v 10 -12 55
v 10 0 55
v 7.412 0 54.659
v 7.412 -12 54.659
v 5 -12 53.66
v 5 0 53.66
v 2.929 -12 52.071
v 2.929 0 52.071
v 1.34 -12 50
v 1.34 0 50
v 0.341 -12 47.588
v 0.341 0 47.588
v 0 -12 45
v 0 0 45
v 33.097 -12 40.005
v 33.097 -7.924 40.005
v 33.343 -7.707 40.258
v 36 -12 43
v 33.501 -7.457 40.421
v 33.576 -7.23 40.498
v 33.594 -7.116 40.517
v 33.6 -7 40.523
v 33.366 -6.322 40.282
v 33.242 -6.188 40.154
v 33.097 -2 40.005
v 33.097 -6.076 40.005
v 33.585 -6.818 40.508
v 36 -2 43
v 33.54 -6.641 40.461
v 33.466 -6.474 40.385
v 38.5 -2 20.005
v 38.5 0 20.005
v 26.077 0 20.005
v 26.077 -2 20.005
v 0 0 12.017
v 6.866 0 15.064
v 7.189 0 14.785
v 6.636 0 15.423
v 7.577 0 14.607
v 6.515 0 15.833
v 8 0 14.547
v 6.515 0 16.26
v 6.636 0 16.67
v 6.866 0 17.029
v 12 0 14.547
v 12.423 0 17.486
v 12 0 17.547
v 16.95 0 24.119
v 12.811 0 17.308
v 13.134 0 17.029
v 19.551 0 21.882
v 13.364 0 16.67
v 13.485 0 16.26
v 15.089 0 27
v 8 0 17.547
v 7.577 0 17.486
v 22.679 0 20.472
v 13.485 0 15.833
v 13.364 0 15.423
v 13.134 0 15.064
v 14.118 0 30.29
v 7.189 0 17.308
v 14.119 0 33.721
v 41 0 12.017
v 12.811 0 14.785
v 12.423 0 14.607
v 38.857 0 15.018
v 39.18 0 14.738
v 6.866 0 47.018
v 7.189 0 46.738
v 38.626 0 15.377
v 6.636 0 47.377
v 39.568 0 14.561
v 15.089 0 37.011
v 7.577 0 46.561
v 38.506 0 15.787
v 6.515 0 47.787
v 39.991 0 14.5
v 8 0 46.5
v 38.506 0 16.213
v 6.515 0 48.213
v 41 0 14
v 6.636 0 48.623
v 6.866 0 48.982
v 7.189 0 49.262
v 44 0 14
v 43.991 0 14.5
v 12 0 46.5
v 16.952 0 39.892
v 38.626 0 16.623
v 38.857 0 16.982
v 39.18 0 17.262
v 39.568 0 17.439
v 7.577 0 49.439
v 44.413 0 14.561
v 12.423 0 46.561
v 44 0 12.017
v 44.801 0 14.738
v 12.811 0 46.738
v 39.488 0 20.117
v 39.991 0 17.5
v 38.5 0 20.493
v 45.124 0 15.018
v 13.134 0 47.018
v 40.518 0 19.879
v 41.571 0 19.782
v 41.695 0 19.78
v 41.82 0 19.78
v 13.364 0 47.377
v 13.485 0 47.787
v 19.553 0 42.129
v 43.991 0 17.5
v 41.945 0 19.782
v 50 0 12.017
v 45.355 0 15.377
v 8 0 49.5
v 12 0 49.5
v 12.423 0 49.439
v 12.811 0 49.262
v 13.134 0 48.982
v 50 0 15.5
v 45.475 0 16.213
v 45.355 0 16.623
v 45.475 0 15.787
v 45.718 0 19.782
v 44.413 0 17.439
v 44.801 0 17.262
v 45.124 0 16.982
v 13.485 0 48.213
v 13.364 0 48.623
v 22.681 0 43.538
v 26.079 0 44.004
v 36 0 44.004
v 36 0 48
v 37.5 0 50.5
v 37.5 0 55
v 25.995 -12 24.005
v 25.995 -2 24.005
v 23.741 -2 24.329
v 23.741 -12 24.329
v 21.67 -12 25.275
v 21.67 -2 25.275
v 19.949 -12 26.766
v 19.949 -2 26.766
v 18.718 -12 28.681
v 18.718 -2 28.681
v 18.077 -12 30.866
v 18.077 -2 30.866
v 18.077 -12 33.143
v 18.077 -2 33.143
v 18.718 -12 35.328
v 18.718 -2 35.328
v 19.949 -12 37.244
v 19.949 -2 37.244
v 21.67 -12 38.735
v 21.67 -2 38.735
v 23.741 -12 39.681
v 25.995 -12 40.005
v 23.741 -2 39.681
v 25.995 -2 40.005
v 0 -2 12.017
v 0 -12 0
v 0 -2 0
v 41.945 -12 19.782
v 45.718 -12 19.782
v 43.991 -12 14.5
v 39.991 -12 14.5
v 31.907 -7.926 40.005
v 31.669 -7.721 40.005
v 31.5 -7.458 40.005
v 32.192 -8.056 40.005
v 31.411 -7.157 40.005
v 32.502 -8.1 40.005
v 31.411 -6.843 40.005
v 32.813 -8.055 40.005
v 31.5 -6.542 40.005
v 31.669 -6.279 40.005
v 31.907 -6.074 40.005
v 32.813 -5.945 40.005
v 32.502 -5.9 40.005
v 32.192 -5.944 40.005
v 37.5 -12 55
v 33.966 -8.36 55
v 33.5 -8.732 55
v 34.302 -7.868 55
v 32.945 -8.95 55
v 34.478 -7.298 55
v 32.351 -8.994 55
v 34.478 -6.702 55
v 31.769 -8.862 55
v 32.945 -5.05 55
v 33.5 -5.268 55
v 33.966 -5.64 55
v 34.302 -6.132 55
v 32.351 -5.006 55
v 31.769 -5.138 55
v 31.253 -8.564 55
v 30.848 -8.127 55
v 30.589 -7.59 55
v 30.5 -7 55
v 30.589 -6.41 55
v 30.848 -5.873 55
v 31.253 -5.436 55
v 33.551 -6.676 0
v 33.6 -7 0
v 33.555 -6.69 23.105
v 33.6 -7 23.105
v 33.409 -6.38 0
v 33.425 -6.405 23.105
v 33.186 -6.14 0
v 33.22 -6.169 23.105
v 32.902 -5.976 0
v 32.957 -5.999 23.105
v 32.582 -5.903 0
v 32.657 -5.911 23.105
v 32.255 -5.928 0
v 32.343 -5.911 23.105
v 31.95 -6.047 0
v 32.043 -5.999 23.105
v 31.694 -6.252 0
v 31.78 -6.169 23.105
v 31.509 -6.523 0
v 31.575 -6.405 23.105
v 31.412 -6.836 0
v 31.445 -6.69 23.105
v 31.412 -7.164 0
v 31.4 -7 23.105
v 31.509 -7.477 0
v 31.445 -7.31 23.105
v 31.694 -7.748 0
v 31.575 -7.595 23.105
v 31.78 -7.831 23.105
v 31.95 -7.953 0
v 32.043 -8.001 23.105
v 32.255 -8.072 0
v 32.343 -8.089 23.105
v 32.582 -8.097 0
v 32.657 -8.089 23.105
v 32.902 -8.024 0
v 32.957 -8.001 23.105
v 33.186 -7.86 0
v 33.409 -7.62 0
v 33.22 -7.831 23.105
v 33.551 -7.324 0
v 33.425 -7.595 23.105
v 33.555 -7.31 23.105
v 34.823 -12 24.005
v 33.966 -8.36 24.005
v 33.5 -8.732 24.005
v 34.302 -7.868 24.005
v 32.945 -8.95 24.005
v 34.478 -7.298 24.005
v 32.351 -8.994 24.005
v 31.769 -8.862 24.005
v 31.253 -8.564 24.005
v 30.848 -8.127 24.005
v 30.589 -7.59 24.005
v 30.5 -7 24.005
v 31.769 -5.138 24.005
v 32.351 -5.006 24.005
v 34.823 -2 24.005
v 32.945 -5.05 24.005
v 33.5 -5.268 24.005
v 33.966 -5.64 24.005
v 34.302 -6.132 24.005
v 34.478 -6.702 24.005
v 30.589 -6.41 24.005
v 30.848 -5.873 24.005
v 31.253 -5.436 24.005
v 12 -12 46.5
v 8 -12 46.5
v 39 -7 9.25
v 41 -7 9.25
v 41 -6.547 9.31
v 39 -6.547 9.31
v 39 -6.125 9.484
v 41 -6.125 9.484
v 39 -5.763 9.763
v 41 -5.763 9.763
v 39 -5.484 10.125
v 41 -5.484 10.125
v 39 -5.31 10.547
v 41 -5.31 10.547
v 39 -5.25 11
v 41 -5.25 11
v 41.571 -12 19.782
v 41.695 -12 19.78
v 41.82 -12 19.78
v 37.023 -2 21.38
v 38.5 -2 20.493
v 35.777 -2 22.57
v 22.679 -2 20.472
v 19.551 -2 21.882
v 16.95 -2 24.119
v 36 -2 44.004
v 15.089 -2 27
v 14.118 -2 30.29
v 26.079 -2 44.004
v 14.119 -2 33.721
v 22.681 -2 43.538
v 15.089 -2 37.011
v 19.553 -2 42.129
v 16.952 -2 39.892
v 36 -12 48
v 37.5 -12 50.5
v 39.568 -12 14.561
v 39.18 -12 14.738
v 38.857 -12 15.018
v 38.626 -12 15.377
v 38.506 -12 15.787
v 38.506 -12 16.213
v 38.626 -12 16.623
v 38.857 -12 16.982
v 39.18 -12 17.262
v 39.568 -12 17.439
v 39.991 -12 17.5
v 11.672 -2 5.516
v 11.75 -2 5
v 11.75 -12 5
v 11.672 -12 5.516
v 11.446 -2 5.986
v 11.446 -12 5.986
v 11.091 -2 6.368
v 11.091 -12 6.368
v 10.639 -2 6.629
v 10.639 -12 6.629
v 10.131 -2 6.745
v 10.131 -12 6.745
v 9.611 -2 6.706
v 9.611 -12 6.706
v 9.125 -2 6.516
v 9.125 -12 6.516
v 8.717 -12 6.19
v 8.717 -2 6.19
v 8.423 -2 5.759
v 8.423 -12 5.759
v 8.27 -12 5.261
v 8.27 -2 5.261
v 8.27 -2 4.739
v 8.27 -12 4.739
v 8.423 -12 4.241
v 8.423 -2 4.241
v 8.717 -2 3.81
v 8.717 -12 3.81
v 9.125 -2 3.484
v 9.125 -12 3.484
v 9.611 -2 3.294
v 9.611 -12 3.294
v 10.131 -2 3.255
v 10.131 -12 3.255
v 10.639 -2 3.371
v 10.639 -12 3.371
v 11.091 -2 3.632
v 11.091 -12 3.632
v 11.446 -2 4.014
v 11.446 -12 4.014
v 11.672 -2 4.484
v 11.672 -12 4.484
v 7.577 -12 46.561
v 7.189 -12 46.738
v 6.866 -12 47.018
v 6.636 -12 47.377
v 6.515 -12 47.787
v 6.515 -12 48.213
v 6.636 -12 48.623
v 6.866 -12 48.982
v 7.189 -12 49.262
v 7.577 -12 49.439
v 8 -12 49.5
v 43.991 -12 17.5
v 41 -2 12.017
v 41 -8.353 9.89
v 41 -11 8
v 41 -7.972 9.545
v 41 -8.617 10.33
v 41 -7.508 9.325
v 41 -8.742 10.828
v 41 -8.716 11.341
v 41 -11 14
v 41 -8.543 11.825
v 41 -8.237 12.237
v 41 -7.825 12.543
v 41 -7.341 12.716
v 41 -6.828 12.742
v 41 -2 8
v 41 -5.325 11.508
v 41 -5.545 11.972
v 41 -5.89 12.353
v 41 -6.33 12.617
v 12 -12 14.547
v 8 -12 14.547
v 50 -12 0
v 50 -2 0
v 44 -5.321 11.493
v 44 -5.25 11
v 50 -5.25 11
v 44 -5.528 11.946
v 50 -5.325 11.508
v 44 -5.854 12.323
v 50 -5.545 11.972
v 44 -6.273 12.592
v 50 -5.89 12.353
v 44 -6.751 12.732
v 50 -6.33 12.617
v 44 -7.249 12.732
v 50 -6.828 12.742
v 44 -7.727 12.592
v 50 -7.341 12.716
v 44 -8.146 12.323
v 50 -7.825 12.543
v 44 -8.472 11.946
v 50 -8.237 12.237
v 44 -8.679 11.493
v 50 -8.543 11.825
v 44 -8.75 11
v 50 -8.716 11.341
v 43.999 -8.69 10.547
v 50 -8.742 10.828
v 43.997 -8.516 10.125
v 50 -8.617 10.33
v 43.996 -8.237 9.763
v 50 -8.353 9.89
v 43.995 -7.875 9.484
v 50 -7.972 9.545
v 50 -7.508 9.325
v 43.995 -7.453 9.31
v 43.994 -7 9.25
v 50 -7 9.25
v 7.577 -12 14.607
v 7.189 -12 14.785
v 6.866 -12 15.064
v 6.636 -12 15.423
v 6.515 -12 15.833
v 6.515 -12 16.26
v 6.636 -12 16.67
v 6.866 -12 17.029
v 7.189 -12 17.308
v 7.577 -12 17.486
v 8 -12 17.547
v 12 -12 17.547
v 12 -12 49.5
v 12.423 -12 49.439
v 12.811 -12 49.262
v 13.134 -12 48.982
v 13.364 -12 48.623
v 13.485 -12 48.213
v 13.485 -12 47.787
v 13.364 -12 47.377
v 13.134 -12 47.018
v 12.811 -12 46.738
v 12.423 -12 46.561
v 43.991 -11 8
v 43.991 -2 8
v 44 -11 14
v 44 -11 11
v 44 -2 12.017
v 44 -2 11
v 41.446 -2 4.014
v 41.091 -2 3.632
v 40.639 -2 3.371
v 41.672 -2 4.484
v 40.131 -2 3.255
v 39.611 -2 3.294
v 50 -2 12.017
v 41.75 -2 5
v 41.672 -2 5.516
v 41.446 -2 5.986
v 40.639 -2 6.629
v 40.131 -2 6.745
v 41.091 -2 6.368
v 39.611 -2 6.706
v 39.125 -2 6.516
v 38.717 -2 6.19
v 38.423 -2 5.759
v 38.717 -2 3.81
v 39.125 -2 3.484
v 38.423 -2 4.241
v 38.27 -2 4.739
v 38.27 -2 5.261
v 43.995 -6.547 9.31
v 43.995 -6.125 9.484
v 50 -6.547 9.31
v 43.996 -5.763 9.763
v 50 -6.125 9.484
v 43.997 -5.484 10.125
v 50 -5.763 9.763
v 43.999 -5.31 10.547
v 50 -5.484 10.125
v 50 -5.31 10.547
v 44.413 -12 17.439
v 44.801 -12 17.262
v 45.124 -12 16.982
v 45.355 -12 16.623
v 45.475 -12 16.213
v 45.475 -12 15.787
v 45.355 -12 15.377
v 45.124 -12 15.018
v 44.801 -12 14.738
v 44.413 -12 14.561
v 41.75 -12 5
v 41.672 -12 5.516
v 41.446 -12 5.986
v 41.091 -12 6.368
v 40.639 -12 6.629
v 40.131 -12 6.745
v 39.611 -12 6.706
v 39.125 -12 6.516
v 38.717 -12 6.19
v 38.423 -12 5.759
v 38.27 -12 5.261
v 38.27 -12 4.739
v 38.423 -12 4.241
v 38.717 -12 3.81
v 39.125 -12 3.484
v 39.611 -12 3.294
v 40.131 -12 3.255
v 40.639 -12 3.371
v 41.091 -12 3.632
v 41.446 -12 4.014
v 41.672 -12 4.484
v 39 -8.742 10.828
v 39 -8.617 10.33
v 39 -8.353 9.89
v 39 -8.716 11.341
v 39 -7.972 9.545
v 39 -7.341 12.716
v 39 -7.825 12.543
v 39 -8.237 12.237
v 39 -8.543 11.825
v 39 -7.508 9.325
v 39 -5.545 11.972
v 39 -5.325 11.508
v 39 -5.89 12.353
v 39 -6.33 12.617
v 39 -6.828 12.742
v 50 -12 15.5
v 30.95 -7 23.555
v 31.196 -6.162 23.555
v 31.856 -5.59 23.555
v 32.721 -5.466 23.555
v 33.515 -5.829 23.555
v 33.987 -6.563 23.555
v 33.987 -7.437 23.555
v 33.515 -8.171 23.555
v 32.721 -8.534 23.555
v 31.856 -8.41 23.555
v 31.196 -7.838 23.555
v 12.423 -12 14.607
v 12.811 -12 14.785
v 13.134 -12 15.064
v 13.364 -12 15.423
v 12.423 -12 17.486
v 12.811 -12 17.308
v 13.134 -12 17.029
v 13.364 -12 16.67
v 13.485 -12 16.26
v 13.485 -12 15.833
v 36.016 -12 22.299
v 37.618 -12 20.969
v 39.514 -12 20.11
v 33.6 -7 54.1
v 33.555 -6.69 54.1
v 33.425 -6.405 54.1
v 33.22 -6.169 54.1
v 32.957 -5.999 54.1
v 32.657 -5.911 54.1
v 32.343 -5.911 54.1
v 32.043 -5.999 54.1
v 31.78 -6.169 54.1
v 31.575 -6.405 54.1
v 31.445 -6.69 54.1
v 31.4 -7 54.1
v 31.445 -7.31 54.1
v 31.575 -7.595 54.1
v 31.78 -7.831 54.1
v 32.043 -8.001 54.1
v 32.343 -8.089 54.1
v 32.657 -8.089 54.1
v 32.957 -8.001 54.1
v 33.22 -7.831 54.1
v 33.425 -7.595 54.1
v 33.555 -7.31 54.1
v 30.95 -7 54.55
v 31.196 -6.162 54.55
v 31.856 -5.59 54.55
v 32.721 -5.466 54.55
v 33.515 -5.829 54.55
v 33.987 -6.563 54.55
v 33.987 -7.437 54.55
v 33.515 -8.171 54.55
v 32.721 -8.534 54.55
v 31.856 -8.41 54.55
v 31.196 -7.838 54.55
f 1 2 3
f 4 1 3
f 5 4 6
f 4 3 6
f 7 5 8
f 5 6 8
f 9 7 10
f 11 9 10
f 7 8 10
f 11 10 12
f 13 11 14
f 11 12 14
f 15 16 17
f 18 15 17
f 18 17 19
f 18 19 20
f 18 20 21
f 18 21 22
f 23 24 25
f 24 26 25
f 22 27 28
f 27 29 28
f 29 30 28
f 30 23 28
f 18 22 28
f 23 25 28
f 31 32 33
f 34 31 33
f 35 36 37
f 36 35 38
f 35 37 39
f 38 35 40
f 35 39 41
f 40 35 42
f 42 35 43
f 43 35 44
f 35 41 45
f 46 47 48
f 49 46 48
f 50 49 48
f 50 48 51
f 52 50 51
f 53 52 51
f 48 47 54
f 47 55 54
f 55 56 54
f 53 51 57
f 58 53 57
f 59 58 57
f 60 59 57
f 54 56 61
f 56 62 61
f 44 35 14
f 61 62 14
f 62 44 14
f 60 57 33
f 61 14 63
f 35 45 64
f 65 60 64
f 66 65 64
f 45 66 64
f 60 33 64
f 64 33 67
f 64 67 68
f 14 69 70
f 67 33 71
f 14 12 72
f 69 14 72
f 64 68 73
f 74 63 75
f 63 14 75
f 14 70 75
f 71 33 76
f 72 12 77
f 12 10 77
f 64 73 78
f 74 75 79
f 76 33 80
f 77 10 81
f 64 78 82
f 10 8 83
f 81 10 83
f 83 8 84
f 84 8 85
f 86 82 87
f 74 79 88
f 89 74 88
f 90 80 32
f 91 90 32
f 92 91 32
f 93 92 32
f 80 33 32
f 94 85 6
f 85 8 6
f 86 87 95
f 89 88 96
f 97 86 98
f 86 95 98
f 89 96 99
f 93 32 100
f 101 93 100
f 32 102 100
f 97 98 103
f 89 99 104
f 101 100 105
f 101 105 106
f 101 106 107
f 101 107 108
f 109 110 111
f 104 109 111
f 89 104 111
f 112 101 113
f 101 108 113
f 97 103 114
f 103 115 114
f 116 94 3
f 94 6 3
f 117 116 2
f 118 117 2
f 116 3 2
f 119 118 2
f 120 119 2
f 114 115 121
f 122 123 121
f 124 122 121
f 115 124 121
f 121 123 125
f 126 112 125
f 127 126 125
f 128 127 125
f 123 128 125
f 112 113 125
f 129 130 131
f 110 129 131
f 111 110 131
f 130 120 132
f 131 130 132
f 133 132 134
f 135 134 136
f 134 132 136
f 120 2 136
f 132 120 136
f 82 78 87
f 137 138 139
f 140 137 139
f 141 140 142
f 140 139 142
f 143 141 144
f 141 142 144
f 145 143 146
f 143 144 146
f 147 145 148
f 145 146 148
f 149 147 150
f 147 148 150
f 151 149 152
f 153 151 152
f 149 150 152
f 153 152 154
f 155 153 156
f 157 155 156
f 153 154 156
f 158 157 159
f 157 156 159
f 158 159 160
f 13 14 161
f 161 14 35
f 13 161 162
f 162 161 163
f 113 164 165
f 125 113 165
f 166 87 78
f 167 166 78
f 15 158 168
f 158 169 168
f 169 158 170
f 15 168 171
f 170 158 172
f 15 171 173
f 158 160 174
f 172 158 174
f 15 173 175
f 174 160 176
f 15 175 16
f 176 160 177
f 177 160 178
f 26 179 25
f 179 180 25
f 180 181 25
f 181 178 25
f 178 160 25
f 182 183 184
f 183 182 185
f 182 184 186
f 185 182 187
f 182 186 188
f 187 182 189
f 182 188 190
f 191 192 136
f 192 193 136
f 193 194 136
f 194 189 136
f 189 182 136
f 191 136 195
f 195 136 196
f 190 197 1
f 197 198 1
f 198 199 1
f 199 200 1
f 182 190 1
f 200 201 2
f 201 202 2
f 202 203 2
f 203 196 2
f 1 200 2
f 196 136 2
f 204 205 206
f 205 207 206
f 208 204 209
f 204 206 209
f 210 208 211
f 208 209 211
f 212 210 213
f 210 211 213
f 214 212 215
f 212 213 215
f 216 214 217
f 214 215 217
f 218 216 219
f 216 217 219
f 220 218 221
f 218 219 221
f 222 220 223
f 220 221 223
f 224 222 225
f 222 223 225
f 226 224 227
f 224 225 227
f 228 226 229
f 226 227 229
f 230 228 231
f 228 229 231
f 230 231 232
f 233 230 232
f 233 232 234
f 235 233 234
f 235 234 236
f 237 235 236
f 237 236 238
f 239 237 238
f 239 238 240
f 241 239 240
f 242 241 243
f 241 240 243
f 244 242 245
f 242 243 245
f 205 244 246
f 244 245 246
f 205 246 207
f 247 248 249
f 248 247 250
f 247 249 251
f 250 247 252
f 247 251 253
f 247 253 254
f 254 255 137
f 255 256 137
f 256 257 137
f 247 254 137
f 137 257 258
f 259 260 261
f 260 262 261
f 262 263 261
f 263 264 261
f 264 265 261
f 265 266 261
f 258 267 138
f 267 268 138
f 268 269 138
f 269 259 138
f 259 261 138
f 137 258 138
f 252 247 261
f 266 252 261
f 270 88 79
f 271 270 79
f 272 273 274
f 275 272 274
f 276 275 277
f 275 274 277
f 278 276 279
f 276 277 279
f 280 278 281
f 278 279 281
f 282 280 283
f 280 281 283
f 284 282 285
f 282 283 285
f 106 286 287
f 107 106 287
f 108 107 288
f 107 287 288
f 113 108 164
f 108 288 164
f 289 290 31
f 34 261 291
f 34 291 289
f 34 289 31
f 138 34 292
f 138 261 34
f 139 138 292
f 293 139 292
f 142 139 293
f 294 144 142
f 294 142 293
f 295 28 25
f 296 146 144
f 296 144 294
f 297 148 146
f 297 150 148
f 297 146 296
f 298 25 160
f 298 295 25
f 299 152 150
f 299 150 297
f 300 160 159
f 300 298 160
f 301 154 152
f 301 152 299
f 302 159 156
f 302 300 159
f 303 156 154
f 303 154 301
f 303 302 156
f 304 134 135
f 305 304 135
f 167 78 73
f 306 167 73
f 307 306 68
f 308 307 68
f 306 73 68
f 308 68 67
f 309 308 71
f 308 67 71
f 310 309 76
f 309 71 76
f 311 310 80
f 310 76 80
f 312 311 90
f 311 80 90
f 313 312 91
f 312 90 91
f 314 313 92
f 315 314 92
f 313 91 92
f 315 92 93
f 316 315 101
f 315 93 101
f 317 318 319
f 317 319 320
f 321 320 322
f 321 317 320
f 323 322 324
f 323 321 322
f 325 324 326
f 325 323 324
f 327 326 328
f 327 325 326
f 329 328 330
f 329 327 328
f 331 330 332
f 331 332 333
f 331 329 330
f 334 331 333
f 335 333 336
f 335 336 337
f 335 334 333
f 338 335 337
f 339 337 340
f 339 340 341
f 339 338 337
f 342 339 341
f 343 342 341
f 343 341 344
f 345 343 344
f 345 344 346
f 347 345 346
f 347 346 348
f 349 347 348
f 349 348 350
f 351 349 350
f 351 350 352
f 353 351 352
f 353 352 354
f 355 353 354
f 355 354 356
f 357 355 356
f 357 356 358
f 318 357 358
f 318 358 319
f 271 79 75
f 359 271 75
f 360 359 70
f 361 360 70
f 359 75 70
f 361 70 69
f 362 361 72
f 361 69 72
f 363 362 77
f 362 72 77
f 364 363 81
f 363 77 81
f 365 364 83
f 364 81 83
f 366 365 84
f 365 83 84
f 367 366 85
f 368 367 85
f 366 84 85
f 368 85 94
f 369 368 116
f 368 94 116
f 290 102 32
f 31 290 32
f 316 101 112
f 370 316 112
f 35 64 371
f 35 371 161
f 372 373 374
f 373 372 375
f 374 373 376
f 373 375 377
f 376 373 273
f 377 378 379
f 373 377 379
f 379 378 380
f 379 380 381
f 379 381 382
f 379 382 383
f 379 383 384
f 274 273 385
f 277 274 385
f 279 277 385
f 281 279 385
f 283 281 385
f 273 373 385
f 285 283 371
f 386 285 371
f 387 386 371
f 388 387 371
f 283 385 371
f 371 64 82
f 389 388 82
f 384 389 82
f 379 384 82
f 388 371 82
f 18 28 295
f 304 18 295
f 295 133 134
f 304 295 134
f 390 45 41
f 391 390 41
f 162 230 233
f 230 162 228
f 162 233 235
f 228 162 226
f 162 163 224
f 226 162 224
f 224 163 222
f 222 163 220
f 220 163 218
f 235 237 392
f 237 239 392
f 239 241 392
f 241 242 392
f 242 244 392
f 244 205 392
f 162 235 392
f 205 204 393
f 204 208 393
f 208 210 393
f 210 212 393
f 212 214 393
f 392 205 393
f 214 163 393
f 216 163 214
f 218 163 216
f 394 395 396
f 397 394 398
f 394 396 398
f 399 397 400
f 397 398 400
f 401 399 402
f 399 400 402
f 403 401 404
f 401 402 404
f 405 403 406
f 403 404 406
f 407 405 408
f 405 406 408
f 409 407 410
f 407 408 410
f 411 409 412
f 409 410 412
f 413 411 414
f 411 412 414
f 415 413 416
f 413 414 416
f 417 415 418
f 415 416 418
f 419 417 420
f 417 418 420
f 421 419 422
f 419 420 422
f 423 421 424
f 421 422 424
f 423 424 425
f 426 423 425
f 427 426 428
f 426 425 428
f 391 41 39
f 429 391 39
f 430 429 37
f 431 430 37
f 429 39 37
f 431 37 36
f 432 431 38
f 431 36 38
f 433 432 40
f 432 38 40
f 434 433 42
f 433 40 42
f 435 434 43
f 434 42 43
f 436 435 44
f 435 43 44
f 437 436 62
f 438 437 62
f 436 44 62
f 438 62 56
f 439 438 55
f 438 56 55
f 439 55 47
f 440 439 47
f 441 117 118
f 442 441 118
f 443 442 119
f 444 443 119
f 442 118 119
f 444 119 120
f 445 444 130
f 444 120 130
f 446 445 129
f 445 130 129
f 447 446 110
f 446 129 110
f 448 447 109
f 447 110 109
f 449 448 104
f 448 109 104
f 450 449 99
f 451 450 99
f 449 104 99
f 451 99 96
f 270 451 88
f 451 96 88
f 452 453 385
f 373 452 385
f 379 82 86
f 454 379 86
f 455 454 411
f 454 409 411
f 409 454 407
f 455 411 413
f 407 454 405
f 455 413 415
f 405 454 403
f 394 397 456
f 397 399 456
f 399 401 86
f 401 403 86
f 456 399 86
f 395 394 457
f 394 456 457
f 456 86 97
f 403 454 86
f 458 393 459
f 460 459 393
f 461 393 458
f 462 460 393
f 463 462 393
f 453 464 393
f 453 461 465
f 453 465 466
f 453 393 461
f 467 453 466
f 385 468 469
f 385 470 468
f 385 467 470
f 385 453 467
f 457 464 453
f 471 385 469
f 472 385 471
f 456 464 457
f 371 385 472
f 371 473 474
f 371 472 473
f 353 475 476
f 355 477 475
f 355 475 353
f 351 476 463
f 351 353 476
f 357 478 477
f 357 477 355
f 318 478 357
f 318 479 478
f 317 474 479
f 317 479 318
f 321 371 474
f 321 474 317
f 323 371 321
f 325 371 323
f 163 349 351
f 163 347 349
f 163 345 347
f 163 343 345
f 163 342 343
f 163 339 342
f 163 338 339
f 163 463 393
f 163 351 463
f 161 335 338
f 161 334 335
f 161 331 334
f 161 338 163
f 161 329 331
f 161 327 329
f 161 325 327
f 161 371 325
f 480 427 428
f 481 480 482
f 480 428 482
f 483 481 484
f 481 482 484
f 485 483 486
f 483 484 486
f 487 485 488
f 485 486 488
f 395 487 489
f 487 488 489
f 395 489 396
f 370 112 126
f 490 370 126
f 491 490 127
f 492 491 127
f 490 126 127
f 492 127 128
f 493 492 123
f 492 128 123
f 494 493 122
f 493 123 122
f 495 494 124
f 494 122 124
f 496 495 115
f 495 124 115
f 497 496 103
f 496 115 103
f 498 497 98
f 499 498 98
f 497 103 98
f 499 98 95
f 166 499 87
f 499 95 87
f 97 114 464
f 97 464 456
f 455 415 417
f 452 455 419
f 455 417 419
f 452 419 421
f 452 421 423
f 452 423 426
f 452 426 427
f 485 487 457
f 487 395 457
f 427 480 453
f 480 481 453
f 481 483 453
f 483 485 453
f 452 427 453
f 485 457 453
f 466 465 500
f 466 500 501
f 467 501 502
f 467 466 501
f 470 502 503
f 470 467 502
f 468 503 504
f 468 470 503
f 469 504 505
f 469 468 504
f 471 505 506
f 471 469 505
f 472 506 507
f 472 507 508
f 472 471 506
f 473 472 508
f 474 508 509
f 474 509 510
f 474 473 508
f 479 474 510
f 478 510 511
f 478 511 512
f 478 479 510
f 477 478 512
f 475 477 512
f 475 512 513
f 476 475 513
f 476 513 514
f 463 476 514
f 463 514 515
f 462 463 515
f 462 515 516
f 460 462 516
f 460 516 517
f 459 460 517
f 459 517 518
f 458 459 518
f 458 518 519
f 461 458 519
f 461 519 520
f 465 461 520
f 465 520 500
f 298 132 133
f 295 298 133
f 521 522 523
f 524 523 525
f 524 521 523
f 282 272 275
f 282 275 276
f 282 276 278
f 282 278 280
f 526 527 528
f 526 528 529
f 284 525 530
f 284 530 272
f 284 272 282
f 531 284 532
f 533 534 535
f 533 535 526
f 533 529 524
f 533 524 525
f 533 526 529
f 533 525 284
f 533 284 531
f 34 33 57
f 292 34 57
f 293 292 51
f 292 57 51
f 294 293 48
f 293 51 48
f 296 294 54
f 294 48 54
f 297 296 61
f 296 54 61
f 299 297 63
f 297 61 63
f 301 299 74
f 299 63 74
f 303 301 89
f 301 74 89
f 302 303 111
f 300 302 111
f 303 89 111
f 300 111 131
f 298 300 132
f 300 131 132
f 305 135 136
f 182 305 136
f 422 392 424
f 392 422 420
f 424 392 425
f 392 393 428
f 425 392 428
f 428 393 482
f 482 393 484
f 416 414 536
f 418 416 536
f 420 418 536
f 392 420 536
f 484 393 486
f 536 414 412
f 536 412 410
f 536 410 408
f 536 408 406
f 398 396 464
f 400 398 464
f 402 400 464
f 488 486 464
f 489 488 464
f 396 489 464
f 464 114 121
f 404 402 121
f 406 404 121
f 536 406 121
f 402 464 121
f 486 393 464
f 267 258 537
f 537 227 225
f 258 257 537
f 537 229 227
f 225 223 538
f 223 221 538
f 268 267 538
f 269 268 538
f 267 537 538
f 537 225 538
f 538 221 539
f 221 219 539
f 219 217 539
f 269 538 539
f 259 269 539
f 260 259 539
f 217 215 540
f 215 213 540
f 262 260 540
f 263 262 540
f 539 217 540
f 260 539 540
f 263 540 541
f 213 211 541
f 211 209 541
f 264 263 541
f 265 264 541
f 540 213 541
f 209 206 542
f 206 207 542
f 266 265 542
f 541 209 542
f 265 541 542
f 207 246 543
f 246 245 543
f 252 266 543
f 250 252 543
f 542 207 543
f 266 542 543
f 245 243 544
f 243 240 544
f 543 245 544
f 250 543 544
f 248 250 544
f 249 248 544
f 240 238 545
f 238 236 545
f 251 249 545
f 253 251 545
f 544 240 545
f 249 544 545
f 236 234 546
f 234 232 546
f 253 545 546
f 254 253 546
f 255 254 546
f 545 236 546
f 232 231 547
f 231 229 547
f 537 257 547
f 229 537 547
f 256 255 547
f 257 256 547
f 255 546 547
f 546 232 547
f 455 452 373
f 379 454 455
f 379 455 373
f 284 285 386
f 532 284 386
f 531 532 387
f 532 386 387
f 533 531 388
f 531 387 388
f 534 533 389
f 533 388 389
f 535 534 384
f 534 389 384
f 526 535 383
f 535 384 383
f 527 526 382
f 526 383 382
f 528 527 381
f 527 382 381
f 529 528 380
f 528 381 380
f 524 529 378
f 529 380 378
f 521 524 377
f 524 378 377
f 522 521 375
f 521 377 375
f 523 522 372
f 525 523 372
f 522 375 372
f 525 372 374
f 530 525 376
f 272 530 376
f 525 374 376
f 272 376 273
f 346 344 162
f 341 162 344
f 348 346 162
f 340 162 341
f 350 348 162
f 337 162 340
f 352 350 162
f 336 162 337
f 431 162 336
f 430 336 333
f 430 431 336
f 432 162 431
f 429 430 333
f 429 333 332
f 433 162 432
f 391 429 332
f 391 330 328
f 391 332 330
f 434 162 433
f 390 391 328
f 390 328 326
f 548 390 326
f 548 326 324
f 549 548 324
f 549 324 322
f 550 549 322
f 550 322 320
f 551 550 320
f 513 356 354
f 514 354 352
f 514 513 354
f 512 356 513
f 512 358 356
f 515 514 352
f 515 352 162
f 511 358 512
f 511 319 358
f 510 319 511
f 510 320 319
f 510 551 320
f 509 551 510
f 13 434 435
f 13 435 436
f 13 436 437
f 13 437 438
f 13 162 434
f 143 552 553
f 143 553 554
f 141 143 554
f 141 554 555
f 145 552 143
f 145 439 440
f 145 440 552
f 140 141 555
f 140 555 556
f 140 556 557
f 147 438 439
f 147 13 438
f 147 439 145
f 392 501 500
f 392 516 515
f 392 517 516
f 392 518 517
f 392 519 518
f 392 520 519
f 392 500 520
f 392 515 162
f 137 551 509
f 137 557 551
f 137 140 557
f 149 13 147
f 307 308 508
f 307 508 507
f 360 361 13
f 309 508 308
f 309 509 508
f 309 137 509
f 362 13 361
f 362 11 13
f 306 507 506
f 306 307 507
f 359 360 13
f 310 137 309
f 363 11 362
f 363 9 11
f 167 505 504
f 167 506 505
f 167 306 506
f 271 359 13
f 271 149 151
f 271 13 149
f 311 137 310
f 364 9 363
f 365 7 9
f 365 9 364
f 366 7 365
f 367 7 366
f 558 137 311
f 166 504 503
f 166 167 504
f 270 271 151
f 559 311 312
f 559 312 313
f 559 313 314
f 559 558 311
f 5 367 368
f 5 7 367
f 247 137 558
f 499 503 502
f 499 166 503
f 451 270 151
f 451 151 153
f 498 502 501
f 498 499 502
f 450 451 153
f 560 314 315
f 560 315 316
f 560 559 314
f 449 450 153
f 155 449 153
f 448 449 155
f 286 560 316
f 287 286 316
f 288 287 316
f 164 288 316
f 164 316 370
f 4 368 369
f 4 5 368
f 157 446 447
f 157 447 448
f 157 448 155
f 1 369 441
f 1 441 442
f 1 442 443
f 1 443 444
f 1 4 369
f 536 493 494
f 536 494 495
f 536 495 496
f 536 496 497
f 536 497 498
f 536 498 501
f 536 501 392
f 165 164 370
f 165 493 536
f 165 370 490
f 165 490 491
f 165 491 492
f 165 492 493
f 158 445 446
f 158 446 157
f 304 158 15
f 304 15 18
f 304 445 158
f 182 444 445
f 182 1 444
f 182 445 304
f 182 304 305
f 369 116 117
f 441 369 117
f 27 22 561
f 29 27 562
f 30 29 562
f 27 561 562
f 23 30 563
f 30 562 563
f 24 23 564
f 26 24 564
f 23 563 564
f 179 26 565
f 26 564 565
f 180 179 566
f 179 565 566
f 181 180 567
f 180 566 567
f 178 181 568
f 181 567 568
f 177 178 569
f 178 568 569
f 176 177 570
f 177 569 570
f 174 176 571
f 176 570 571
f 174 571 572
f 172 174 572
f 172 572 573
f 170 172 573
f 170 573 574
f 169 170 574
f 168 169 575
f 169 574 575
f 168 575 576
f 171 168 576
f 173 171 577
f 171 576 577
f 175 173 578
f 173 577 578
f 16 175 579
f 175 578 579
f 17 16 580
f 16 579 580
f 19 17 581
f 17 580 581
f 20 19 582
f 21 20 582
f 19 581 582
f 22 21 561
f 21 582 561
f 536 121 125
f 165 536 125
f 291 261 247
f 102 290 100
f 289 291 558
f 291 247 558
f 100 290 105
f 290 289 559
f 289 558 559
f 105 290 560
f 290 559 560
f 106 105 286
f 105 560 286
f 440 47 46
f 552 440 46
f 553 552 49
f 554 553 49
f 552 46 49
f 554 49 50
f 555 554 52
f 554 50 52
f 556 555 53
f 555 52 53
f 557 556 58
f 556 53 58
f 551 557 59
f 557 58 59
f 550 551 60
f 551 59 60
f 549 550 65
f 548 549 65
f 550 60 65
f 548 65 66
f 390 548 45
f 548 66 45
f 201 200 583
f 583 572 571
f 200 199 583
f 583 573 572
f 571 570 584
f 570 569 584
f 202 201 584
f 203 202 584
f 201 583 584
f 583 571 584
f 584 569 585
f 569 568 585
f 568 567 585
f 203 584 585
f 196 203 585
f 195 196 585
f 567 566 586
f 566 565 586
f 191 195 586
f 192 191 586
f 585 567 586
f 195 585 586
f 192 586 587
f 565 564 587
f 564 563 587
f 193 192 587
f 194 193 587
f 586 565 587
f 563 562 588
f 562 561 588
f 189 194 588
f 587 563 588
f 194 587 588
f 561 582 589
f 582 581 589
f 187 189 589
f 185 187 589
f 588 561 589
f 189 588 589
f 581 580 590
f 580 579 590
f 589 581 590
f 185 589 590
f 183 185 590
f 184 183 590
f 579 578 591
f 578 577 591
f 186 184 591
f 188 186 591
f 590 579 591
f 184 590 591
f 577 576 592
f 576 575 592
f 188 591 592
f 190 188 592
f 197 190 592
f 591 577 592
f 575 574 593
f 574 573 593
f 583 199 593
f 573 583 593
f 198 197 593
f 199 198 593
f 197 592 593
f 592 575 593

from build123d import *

# Parameters (mm, degrees)
F0_R            = 1.75
F1_DEPTH        = 12
F3_DEPTH        = 2
F4_W            = 50
F4_H            = 12.016664
F5_DEPTH        = 2
F6_R            = 1.1
F7_DEPTH        = 60
F9_DEPTH        = 11
F11_DEPTH       = 11
F13_D           = 2.2
F13_DEPTH       = 3
F13_CSINK_D     = 4
F13_CSINK_ANGLE = 90
F15_D           = 2.2
F15_DEPTH       = 3
F15_CSINK_D     = 4
F15_CSINK_ANGLE = 90
F17_DEPTH       = 25


with BuildPart() as f1:
    # F0 (on Front) → F1 (new body)
    with BuildSketch(Plane.XZ):
        with BuildLine():
            Line((0, 45), (0, 0))
            Line((0, 0), (50, 0))
            Line((50, 0), (50, 15.500001))
            Line((50, 15.500001), (45, 20.500001))
            Line((45, 20.500001), (38.5, 20.500001))
            Line((38.5, 20.500001), (34.995267, 24.004733))
            Line((34.995267, 24.004733), (25.995267, 24.004733))
            ThreePointArc((25.995267, 24.004733), (17.995267, 32.004733), (25.995267, 40.004733))
            Line((25.995267, 40.004733), (33.097442, 40.004733))
            Line((33.097442, 40.004733), (36, 43))
            Line((36, 43), (36, 48))
            Line((36, 48), (37.5, 50.5))
            Line((37.5, 50.5), (37.5, 55))
            Line((37.5, 55), (10, 55))
            ThreePointArc((10, 55), (2.928932, 52.071068), (0, 45))
        make_face()
        with Locations((10, 5)):
            Circle(F0_R, mode=Mode.SUBTRACT)
        with BuildLine():
            ThreePointArc((12, 17.546566), (13.5, 16.046566), (12, 14.546566))
            Line((12, 14.546566), (8, 14.546566))
            ThreePointArc((8, 14.546566), (6.5, 16.046566), (8, 17.546566))
            Line((8, 17.546566), (12, 17.546566))
        make_face(mode=Mode.SUBTRACT)
        with Locations((40, 5)):
            Circle(F0_R, mode=Mode.SUBTRACT)
        with BuildLine():
            ThreePointArc((43.990533, 17.500001), (45.490533, 16.000001), (43.990533, 14.500001))
            Line((43.990533, 14.500001), (39.990533, 14.500001))
            ThreePointArc((39.990533, 14.500001), (38.490533, 16.000001), (39.990533, 17.500001))
            Line((39.990533, 17.500001), (43.990533, 17.500001))
        make_face(mode=Mode.SUBTRACT)
        with BuildLine():
            ThreePointArc((12, 49.5), (13.5, 48), (12, 46.5))
            Line((12, 46.5), (8, 46.5))
            ThreePointArc((8, 46.5), (6.5, 48), (8, 49.5))
            Line((8, 49.5), (12, 49.5))
        make_face(mode=Mode.SUBTRACT)
    extrude(amount=F1_DEPTH)

    # F2 (on face) → F3 (cut)
    with BuildSketch(Plane(origin=(0, 0, 0), x_dir=(-1, 0, 0), z_dir=(0, 1, 0))):
        with BuildLine():
            Line((-38.5, 20.005015), (-26.077409, 20.005015))
            ThreePointArc((-26.077409, 20.005015), (-13.995267, 32.0056), (-26.079143, 44.00444))
            Line((-26.079143, 44.00444), (-36, 44.00444))
            Line((-36, 44.00444), (-38.5, 44.00444))
            Line((-38.5, 44.00444), (-38.5, 20.500001))
            Line((-38.5, 20.500001), (-38.5, 20.005015))
        make_face()
    extrude(amount=-F3_DEPTH, mode=Mode.SUBTRACT)

    # F4 (on face) → F5 (cut)
    with BuildSketch(Plane(origin=(0, 0, 0), x_dir=(-1, 0, 0), z_dir=(0, 1, 0))):
        with Locations((-25, 6.008332)):
            Rectangle(F4_W, F4_H)
    extrude(amount=-F5_DEPTH, mode=Mode.SUBTRACT)

    # F6 (on face) → F7 (cut)
    with BuildSketch(Plane.XY.offset(55)):
        with Locations((32.499979, -7)):
            Circle(F6_R)
    extrude(amount=-F7_DEPTH, mode=Mode.SUBTRACT)

    # F8 (on face) → F9 (cut)
    with BuildSketch(Plane.YZ.offset(50)):
        with BuildLine():
            ThreePointArc((-7, 9.25), (-5.762563, 9.762563), (-5.25, 11))
            ThreePointArc((-5.25, 11), (-8.237437, 12.237437), (-7, 9.25))
        make_face()
    extrude(amount=-F9_DEPTH, mode=Mode.SUBTRACT)

    # F10 (on face) → F11 (cut)
    with BuildSketch(Plane(origin=(0, 0, 0), x_dir=(-1, 0, 0), z_dir=(0, 1, 0))):
        Polygon((-44, 14), (-44, 11), (-43.990533, 8), (-41, 8), (-41, 14), align=None)
    extrude(amount=-F11_DEPTH, mode=Mode.SUBTRACT)

    # F13
    with Locations(Plane.XY.offset(24.004733)):
        with Locations((32.499979, -7)):
            CounterSinkHole(F13_D / 2, F13_CSINK_D / 2, depth=F13_DEPTH, counter_sink_angle=F13_CSINK_ANGLE)

    # F15
    with Locations(Plane.XY.offset(55)):
        with Locations((32.499979, -7)):
            CounterSinkHole(F15_D / 2, F15_CSINK_D / 2, depth=F15_DEPTH, counter_sink_angle=F15_CSINK_ANGLE)

    # F16 (on face) → F17 (cut)
    with BuildSketch(Plane.XZ.offset(12)):
        with BuildLine():
            Line((45.717547, 19.782453), (45.717547, 20.859413))
            ThreePointArc((45.717547, 20.859413), (39.79599, 35.138554), (41.570501, 19.782453))
            Line((41.570501, 19.782453), (41.944866, 19.782453))
            Line((41.944866, 19.782453), (45.717547, 19.782453))
        make_face()
        with BuildLine():
            Line((41.944866, 19.782453), (41.570501, 19.782453))
            ThreePointArc((41.570501, 19.782453), (41.757683, 19.780208), (41.944866, 19.782453))
        make_face()
    extrude(amount=-F17_DEPTH, mode=Mode.SUBTRACT)


solid = f1.part
